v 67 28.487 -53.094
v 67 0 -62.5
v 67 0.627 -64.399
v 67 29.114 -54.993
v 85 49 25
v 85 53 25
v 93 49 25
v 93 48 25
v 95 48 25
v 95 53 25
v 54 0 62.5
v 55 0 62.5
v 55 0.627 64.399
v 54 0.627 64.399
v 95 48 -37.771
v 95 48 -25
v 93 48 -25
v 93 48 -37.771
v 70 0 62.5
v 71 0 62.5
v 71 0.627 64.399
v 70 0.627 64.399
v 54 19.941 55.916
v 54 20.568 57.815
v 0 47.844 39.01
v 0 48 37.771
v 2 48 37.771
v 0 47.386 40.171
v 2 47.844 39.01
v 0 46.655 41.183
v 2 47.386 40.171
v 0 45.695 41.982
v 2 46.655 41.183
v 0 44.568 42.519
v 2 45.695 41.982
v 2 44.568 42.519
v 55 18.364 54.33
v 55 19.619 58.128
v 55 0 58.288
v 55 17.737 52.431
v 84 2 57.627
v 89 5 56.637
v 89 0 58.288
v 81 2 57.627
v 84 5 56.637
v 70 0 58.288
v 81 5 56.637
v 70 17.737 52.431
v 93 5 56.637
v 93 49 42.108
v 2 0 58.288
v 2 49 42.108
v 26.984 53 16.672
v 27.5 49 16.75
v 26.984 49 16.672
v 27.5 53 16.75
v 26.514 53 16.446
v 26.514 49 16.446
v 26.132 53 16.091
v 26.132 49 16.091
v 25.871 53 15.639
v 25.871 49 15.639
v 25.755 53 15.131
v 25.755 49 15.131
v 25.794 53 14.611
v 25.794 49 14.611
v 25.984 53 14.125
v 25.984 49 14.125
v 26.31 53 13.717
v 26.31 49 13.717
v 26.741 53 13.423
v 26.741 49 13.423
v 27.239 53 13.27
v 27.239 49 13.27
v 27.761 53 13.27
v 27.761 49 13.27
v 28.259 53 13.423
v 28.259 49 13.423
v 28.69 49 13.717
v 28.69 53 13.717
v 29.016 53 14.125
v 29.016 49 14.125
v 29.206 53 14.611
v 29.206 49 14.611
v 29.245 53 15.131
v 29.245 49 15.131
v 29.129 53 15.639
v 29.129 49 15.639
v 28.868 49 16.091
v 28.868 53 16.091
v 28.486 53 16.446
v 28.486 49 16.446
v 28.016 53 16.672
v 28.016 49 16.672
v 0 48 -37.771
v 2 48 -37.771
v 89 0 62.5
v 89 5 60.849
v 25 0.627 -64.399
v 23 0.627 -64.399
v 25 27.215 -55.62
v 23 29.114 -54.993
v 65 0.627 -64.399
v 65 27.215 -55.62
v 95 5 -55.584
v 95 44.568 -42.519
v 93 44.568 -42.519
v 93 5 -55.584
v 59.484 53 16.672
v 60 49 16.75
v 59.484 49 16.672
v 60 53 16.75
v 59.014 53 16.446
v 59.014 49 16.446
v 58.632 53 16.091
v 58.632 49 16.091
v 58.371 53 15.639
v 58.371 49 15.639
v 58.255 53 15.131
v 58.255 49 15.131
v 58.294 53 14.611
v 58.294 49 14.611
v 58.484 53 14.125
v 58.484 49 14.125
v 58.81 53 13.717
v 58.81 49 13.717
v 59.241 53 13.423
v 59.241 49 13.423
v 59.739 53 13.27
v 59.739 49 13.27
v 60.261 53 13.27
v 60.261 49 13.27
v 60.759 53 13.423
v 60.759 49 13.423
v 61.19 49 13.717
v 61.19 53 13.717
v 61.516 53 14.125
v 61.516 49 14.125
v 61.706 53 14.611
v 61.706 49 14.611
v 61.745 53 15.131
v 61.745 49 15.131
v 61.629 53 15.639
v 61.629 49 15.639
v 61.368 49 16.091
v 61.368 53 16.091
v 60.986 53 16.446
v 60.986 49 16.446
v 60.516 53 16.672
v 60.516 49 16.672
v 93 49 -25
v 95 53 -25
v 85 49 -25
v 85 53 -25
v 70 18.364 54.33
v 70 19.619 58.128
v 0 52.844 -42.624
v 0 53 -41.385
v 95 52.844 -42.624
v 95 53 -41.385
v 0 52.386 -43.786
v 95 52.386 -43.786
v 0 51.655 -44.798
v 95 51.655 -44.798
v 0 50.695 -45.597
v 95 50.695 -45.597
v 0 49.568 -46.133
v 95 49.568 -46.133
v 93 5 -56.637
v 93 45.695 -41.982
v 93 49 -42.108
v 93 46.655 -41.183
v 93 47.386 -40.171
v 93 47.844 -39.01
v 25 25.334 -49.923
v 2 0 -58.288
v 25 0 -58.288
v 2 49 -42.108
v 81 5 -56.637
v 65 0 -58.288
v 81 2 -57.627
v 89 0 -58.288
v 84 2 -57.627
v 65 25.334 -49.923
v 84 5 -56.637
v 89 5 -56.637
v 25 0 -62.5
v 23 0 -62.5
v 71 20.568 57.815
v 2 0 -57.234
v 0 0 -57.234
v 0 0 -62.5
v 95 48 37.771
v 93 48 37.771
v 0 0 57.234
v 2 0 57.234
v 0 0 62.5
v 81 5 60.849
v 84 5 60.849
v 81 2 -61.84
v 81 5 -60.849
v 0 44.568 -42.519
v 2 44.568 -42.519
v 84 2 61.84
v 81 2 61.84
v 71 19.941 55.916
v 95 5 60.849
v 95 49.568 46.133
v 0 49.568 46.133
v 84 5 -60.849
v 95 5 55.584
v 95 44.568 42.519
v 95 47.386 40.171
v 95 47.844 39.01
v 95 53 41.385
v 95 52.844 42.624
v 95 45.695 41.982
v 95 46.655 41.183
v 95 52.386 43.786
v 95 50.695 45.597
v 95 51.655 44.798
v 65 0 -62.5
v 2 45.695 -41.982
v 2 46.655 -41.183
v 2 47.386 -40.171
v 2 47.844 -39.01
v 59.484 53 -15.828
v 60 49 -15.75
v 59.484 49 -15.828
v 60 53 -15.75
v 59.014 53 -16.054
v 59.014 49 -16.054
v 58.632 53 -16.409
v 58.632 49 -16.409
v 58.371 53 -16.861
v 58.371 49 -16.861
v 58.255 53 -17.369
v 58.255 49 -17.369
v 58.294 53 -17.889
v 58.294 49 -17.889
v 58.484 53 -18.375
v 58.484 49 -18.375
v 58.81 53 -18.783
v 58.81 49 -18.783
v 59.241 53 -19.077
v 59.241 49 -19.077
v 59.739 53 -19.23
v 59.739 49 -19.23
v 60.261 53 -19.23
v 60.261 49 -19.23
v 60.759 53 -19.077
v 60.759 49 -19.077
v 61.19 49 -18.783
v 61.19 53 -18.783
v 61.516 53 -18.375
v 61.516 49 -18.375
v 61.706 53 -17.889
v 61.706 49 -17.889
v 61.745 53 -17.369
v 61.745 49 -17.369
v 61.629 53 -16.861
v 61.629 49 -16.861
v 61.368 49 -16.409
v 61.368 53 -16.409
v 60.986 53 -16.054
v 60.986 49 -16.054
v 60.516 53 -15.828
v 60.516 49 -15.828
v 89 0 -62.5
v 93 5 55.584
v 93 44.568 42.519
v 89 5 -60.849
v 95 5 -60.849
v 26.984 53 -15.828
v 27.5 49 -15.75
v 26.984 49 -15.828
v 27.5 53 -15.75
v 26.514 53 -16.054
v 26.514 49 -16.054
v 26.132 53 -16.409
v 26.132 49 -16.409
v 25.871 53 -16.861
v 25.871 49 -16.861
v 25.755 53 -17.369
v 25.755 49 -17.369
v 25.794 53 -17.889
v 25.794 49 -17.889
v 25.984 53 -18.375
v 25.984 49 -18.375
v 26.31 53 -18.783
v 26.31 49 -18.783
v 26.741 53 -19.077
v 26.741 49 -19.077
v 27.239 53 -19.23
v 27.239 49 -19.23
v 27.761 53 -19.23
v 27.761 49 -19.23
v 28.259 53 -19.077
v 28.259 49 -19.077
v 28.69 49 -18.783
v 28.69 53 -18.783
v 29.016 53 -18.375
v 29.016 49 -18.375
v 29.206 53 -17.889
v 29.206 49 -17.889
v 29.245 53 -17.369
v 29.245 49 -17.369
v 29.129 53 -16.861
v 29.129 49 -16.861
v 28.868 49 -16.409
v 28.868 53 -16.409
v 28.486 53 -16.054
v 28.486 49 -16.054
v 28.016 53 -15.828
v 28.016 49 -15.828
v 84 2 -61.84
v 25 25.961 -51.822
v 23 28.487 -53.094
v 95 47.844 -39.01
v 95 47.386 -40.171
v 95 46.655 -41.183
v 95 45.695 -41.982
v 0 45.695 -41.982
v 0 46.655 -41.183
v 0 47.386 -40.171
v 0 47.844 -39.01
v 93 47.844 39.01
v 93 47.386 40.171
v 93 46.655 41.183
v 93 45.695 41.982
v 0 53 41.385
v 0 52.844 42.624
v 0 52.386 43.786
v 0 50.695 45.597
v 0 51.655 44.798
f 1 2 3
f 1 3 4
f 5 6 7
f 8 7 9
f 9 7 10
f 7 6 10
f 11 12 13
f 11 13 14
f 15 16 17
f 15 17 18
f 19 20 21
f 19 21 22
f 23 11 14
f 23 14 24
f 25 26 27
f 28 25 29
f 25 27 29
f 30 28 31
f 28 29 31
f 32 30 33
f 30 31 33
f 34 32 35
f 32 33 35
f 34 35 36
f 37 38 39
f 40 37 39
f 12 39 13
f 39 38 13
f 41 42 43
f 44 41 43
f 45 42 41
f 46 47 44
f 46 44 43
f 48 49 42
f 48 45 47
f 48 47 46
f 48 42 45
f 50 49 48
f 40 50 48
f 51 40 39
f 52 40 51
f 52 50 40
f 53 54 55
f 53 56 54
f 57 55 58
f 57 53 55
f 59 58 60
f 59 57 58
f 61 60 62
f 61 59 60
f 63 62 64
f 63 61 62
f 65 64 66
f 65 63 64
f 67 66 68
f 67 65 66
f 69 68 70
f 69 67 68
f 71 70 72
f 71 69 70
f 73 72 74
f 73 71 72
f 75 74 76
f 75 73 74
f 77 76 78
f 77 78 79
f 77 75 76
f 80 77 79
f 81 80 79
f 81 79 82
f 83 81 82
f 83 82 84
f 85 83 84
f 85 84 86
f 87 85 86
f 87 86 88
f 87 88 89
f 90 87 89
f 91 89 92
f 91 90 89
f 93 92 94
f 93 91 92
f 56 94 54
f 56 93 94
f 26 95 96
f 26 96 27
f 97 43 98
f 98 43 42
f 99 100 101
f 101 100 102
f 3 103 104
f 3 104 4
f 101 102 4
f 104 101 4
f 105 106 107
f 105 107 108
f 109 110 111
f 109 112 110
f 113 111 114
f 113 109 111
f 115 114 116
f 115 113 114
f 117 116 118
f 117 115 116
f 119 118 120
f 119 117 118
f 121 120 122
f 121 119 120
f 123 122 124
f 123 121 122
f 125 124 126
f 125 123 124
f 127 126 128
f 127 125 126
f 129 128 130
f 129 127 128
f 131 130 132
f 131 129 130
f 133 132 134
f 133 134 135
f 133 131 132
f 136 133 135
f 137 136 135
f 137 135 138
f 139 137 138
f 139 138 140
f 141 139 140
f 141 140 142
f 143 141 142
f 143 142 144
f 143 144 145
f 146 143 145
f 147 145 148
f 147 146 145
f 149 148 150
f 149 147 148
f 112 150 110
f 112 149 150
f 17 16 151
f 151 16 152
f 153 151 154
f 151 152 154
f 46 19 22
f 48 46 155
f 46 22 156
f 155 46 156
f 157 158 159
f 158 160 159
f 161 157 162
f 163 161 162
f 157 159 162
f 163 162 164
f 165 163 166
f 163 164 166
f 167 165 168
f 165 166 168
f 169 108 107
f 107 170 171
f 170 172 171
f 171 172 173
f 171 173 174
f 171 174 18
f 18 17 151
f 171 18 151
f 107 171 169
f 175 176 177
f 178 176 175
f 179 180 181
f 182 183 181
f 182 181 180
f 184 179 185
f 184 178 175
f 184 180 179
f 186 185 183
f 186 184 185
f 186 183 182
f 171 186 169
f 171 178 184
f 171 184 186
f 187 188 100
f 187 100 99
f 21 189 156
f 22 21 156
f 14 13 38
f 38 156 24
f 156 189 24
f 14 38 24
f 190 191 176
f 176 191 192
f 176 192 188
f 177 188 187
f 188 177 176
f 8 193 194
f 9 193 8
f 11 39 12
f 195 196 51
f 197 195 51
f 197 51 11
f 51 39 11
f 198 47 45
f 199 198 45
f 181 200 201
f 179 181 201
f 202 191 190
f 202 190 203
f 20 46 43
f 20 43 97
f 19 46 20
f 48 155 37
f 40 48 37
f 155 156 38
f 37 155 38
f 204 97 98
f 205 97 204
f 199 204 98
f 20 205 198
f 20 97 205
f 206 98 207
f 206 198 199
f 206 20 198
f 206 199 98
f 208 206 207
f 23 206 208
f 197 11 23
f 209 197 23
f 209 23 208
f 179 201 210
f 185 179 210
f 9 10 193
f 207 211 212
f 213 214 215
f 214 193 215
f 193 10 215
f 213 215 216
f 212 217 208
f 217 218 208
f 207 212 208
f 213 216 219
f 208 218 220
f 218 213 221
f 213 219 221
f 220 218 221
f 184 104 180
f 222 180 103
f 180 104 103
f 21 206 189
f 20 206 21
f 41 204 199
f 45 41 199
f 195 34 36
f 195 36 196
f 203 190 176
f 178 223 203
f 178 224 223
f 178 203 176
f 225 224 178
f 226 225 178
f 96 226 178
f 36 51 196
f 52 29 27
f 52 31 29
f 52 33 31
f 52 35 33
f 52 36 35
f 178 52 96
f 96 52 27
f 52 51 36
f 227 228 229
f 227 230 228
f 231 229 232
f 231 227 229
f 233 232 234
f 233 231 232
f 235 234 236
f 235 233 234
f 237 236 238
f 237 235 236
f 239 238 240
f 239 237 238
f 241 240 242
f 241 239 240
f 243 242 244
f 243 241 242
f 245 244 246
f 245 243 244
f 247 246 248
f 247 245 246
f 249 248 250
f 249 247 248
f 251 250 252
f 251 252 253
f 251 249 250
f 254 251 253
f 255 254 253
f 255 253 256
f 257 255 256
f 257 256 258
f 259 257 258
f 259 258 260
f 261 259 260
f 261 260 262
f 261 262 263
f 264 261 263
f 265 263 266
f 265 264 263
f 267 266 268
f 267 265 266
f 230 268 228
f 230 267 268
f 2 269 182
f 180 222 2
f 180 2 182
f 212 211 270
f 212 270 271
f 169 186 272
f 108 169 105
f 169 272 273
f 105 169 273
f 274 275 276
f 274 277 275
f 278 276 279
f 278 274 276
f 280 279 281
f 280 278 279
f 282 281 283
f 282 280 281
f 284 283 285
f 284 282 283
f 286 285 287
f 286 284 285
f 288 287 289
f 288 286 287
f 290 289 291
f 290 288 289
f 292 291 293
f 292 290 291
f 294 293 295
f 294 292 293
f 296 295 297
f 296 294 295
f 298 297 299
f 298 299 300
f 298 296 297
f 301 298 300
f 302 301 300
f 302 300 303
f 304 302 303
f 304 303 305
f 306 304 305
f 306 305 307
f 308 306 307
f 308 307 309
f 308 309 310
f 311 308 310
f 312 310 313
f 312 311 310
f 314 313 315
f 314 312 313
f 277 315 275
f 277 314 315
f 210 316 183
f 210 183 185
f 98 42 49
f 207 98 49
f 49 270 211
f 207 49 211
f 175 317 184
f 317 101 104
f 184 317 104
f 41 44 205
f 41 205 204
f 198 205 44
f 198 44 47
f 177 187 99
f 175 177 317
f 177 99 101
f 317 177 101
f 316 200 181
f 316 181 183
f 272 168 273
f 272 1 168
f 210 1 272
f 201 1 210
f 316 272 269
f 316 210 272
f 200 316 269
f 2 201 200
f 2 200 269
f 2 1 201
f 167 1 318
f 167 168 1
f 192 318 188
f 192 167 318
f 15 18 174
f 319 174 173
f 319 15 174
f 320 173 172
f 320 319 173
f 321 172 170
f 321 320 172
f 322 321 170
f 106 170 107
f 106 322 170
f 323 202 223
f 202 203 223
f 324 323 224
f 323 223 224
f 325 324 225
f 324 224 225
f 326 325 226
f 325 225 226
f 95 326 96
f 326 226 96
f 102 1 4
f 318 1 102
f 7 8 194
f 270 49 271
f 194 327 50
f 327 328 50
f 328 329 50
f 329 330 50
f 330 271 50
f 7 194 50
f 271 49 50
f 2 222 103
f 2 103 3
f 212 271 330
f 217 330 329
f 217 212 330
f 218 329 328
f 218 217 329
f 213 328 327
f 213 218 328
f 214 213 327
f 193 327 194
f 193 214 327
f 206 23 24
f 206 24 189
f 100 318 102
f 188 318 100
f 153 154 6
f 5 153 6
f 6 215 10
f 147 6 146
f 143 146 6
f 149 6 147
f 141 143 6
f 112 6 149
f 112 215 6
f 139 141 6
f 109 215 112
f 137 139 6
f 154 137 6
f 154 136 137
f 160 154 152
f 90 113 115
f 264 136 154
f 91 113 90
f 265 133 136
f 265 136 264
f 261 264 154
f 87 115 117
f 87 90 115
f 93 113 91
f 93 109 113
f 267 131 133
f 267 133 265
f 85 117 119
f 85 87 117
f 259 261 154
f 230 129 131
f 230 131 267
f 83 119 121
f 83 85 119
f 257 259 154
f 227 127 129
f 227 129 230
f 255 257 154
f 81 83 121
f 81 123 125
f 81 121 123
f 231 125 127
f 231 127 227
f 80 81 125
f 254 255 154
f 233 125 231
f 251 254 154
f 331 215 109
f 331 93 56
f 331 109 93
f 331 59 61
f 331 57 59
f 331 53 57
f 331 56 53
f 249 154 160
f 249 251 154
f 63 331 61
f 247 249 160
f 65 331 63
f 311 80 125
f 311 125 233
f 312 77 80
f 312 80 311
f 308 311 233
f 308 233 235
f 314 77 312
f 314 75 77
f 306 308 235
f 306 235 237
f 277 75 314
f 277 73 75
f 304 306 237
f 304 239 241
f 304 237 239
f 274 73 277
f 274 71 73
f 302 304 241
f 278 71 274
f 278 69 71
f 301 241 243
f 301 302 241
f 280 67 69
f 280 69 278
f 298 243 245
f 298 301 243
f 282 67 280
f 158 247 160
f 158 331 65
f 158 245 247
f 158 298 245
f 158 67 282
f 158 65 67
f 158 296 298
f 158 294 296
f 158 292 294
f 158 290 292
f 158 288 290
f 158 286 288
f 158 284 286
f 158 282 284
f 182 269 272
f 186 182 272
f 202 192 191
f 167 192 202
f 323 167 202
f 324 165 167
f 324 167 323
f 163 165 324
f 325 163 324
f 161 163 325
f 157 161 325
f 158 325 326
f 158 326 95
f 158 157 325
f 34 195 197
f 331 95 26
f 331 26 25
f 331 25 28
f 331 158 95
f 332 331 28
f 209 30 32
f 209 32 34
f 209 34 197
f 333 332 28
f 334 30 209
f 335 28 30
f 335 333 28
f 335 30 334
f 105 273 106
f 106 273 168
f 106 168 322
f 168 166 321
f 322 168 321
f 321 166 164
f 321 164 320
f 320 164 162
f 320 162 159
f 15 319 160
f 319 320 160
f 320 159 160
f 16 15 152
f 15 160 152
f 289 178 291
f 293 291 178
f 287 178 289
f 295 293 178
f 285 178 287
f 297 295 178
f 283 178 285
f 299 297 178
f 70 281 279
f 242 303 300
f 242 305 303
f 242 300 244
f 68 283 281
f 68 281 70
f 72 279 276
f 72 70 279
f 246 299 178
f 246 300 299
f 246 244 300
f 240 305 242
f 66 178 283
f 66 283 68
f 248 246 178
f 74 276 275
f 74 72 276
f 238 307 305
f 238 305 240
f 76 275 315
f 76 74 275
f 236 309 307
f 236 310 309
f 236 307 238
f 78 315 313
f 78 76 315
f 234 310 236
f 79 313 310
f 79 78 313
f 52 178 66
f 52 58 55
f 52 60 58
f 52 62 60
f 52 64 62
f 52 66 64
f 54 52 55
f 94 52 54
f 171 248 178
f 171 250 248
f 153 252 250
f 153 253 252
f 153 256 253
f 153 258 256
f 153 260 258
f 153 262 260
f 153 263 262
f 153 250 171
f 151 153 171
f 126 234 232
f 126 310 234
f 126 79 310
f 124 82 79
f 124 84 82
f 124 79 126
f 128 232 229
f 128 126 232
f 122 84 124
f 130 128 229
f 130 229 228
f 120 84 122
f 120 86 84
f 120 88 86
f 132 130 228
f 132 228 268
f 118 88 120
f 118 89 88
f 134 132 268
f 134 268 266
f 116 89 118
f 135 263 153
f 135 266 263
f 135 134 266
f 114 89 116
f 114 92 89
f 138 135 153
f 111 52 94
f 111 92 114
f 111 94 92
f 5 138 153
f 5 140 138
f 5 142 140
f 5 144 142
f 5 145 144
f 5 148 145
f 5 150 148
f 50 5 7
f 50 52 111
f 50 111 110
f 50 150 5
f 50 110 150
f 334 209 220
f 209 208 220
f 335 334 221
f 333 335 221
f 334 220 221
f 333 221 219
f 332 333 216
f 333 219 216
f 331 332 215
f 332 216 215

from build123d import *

# Parameters (mm, degrees)
EXTRUDE_1_DEPTH          = 95
EXTRUDE_3_DEPTH          = 20
CUT_EXTRUDE_1_DEPTH      = 142.209950074
CUT_EXTRUDE_1_DEPTH_BACK = 142.209950074
SKETCH_4_W               = 7
SKETCH_4_H               = 3
CUT_EXTRUDE_2_DEPTH      = 142.209950074
SHELL_START              = 2
SHELL_1_DEPTH            = 91
SHELL_START_2            = 93
SHELL_1_2_DEPTH          = 2.83772234
SHELL_1_3_DEPTH          = 3
CUT_EXTRUDE_3_DEPTH      = 3
SKETCH_7_R               = 1.75
SKETCH_7_W               = 10
SKETCH_7_H               = 50
CUT_EXTRUDE_4_DEPTH      = 142.209950074
SKETCH_9_W               = 15
SKETCH_9_H               = 20
CUT_EXTRUDE_5_DEPTH      = 3
EXTRUDE_4_DEPTH          = 2
EXTRUDE_6_DEPTH          = 2
SKETCH_13_W              = 40
SKETCH_13_H              = 28
CUT_EXTRUDE_6_DEPTH      = 2
CUT_EXTRUDE_7_DEPTH      = 10
FILLET_1_R               = 5
FILLET_2_R               = 5
EXTRUDE_7_DEPTH          = 2
EXTRUDE_8_DEPTH          = 2
SKETCH_17_R              = 1.75
EXTRUDE_9_DEPTH          = 2
SKETCH_18_W              = 120.1322677
SKETCH_18_H              = 134.585681159
CUT_EXTRUDE_8_DEPTH      = 2
SKETCH_20_W              = 175.540954957
SKETCH_20_H              = 97.306035525
CUT_EXTRUDE_9_DEPTH      = 39
CUT_EXTRUDE_10_DEPTH     = 39
SKETCH_23_W              = 6
SKETCH_23_H              = 5
SKETCH_23_W_2            = 3
SKETCH_23_H_2            = 3
CUT_EXTRUDE_11_DEPTH     = 181.790250578


with BuildPart() as part:
    # 草图1 → 凸台-拉伸1 (new body)
    with BuildSketch(Plane(origin=(0, 0, 0), x_dir=(0, 0, -1), z_dir=(1, 0, 0))):
        Polygon((-62.5, 0), (-45, 53), (45, 53), (62.5, 0), align=None)
    extrude(amount=EXTRUDE_1_DEPTH)

    # 草图3 → 凸台-拉伸3 (add)
    with BuildSketch(Plane(origin=(95, 0, 0), x_dir=(0, 0, -1), z_dir=(1, 0, 0))):
        Polygon((-60.849056604, 5), (-47.5, 5), (-47.5, 0), (-62.5, 0), align=None)
        Polygon((62.5, 0), (60.849056604, 5), (47.5, 5), (47.5, 0), align=None)
    extrude(amount=EXTRUDE_3_DEPTH)

    # 草图4 → 切除-拉伸1 (cut, two sides: drawn at the far end of the back side and taken through both)
    with BuildSketch(Plane.XY.offset(-CUT_EXTRUDE_1_DEPTH_BACK)):
        with Locations((105, 1.5)):
            Rectangle(SKETCH_4_W, SKETCH_4_H)
    extrude(amount=CUT_EXTRUDE_1_DEPTH + CUT_EXTRUDE_1_DEPTH_BACK, mode=Mode.SUBTRACT)

    # 草图5 → 切除-拉伸2 (cut, through all)
    with BuildSketch(Plane.XZ):
        with BuildLine():
            Line((97.5, -59), (97.5, -51))
            ThreePointArc((97.5, -51), (99, -49.5), (100.5, -51))
            Line((100.5, -51), (100.5, -59))
            ThreePointArc((100.5, -59), (99, -60.5), (97.5, -59))
        make_face()
        with BuildLine():
            Line((109.5, -59), (109.5, -51))
            ThreePointArc((109.5, -51), (111, -49.5), (112.5, -51))
            Line((112.5, -51), (112.5, -59))
            ThreePointArc((112.5, -59), (111, -60.5), (109.5, -59))
        make_face()
        with BuildLine():
            Line((97.5, 51), (97.5, 59))
            ThreePointArc((97.5, 59), (99, 60.5), (100.5, 59))
            Line((100.5, 59), (100.5, 51))
            ThreePointArc((100.5, 51), (99, 49.5), (97.5, 51))
        make_face()
        with BuildLine():
            Line((109.5, 51), (109.5, 59))
            ThreePointArc((109.5, 59), (111, 60.5), (112.5, 59))
            Line((112.5, 59), (112.5, 51))
            ThreePointArc((112.5, 51), (111, 49.5), (109.5, 51))
        make_face()
    extrude(amount=-CUT_EXTRUDE_2_DEPTH, mode=Mode.SUBTRACT)

    # 抽壳1: read off the stored shape, not the designer's step
    # 抽壳1 outline → 抽壳1 (cut)
    with BuildSketch(Plane.YZ.offset(SHELL_START)):
        Polygon((51, 43.554172654), (0, 60.393795296), (0, -60.393795296), (51, -43.554172654), align=None)
    extrude(amount=SHELL_1_DEPTH, mode=Mode.SUBTRACT)

    # Shell 1 2 outline → Shell 1 2 (cut)
    with BuildSketch(Plane.YZ.offset(SHELL_START_2)):
        Polygon((3, 49.5), (3, 59.403229258), (0, 60.393795296), (0, 49.5), align=None)
        Polygon((3, -49.5), (0, -49.5), (0, -60.393795296), (3, -59.403229258), align=None)
    extrude(amount=SHELL_1_2_DEPTH, mode=Mode.SUBTRACT)

    # Shell 1 3 outline → Shell 1 3 (add)
    with BuildSketch(Plane(origin=(0, 0, 0), x_dir=(1, 0, 0), z_dir=(0, 1, 0))):
        with BuildLine():
            Line((95.789496196, -60.393795296), (95.83772234, -60.504880632))
            Line((95.83772234, -60.504880632), (95.83772234, -49.5))
            ThreePointArc((95.83772234, -49.5), (95.585474278, -50.231225589), (95.5, -51))
            Line((95.5, -51), (95.5, -59))
            ThreePointArc((95.5, -59), (95.57313822, -59.711771272), (95.789496196, -60.393795296))
        make_face()
        with BuildLine():
            ThreePointArc((95.789496196, 60.393795296), (95.57313822, 59.711771272), (95.5, 59))
            Line((95.5, 59), (95.5, 51))
            ThreePointArc((95.5, 51), (95.585474278, 50.231225589), (95.83772234, 49.5))
            Line((95.83772234, 49.5), (95.83772234, 60.504880632))
            Line((95.83772234, 60.504880632), (95.789496196, 60.393795296))
        make_face()
    extrude(amount=SHELL_1_3_DEPTH)

    # 草图6 → 切除-拉伸3 (cut)
    with BuildSketch(Plane(origin=(95, 0, 0), x_dir=(0, 0, -1), z_dir=(1, 0, 0))):
        with BuildLine():
            Line((-37.770863272, 48), (37.770863272, 48))
            ThreePointArc((37.770863272, 48), (40.700157086, 47.052065862), (42.518739858, 44.567695099))
            Line((42.518739858, 44.567695099), (55.583544844, 5))
            Line((55.583544844, 5), (47.5, 5))
            Line((47.5, 5), (47.5, 0))
            Line((47.5, 0), (-47.5, 0))
            Line((-47.5, 0), (-47.5, 5))
            Line((-47.5, 5), (-55.583544844, 5))
            Line((-55.583544844, 5), (-42.518739858, 44.567695099))
            ThreePointArc((-42.518739858, 44.567695099), (-40.700157086, 47.052065862), (-37.770863272, 48))
        make_face()
    extrude(amount=-CUT_EXTRUDE_3_DEPTH, mode=Mode.SUBTRACT)

    # 草图7 → 切除-拉伸4 (cut, through all)
    with BuildSketch(Plane(origin=(0, 53, 0), x_dir=(1, 0, 0), z_dir=(0, 1, 0))):
        with Locations(Location((60, -15, 0), (0, 0, 270))):
            Circle(SKETCH_7_R)
        with Locations(Location((60, 17.5, 0), (0, 0, 270))):
            Circle(SKETCH_7_R)
        with Locations(Location((27.5, 17.5, 0), (0, 0, 270))):
            Circle(SKETCH_7_R)
        with Locations(Location((27.5, -15, 0), (0, 0, 270))):
            Circle(SKETCH_7_R)
        with Locations((90, 0)):
            Rectangle(SKETCH_7_W, SKETCH_7_H)
    extrude(amount=-CUT_EXTRUDE_4_DEPTH, mode=Mode.SUBTRACT)

    # 草图9 → 切除-拉伸5 (cut)
    with BuildSketch(Plane(origin=(0, 18.608057138, 56.35583019), x_dir=(1, 0, 0), z_dir=(0, 0.3135390198315126, 0.949575317204009))):
        with Locations((62.5, -9.596188739)):
            Rectangle(SKETCH_9_W, SKETCH_9_H)
    extrude(amount=-CUT_EXTRUDE_5_DEPTH, mode=Mode.SUBTRACT)

    # 草图10 → 凸台-拉伸4 (add)
    with BuildSketch(Plane(origin=(0, 18.608057138, 56.35583019), x_dir=(1, 0, 0), z_dir=(0, 0.3135390198315126, 0.949575317204009))):
        Polygon((55, -19.596188739), (54, -19.596188739), (54, 1.403811261), (71, 1.403811261), (71, -19.596188739), (70, -19.596188739), (70, 0.403811261), (55, 0.403811261), align=None)
    extrude(amount=EXTRUDE_4_DEPTH)

    # 草图11 → 凸台-拉伸6 (add)
    with BuildSketch(Plane(origin=(0, 18.608057138, -56.35583019), x_dir=(-1, 0, 0), z_dir=(0, 0.3135390198315126, -0.949575317204009))):
        Polygon((-67, -19.596188739), (-67, 10.403811261), (-23, 10.403811261), (-23, -19.596188739), (-25, -19.596188739), (-25, 8.403811261), (-65, 8.403811261), (-65, -19.596188739), align=None)
    extrude(amount=EXTRUDE_6_DEPTH)

    # 草图13 → 切除-拉伸6 (cut)
    with BuildSketch(Plane(origin=(0, 18.608057138, -56.35583019), x_dir=(-1, 0, 0), z_dir=(0, 0.3135390198315126, -0.949575317204009))):
        with Locations((-45, -5.596188739)):
            Rectangle(SKETCH_13_W, SKETCH_13_H)
    extrude(amount=-CUT_EXTRUDE_6_DEPTH, mode=Mode.SUBTRACT)

    # 草图14 → 切除-拉伸7 (cut)
    with BuildSketch(Plane.ZY):
        Polygon((-41.385431636, 48), (41.385431636, 48), (57.23448824, 0), (-57.23448824, 0), align=None)
    extrude(amount=-CUT_EXTRUDE_7_DEPTH, mode=Mode.SUBTRACT)

    # 圆角1
    fillet_1_edges = [part.edges().sort_by_distance(p)[0] for p in [
        (47.5, 53, 45),
        (47.5, 53, -45),
    ]]
    fillet(fillet_1_edges, radius=FILLET_1_R)

    # 圆角2
    fillet_2_edges = [part.edges().sort_by_distance(p)[0] for p in [
        (1, 48, -41.385431636),
        (1, 48, 41.385431636),
    ]]
    fillet(fillet_2_edges, radius=FILLET_2_R)

    # 草图15 → 凸台-拉伸7 (add)
    with BuildSketch(Plane(origin=(0, 17.980979099, 54.456679556), x_dir=(-1, 0, 0), z_dir=(0, -0.3135390198315126, -0.949575317204009))):
        with BuildLine():
            Line((-70, -18.935811381), (-70, 0.403811261))
            Line((-70, 0.403811261), (-55, 0.403811261))
            Line((-55, 0.403811261), (-55, -18.935811381))
            Line((-55, -18.935811381), (-2, -18.935811381))
            Line((-2, -18.935811381), (-2, 34.772408574))
            Line((-2, 34.772408574), (-93, 34.772408574))
            Line((-93, 34.772408574), (-93, -15.776504325))
            Line((-93, -15.776504325), (-95.523305282, -15.776504325))
            add(Edge.make_bspline(
                [(-95.789496196, -18.935811381), (-95.583035108, -17.41903761), (-95.523305282, -15.776504325)],
                knots=[1.16121292, 1.16121292, 1.16121292, 1.455331574, 1.455331574, 1.455331574], degree=2, weights=[1, 0.989206251, 1]))
            Line((-95.789496196, -18.935811381), (-70, -18.935811381))
        make_face()
    extrude(amount=EXTRUDE_7_DEPTH)

    # 草图16 → 凸台-拉伸8 (add)
    with BuildSketch(Plane(origin=(0, 17.980979099, -54.456679556), x_dir=(1, 0, 0), z_dir=(0, -0.3135390198315126, 0.949575317204009))):
        with BuildLine():
            Line((65, 8.403811261), (65, -18.935811381))
            Line((65, -18.935811381), (95.789496196, -18.935811381))
            add(Edge.make_bspline(
                [(95.523305282, -15.776504325), (95.583035108, -17.41903761), (95.789496196, -18.935811381)],
                knots=[4.827853734, 4.827853734, 4.827853734, 5.121972388, 5.121972388, 5.121972388], degree=2, weights=[1, 0.989206251, 1]))
            Line((95.523305282, -15.776504325), (93, -15.776504325))
            Line((93, -15.776504325), (93, 34.772408574))
            Line((93, 34.772408574), (2, 34.772408574))
            Line((2, 34.772408574), (2, -18.935811381))
            Line((2, -18.935811381), (25, -18.935811381))
            Line((25, -18.935811381), (25, 8.403811261))
            Line((25, 8.403811261), (65, 8.403811261))
        make_face()
    extrude(amount=EXTRUDE_8_DEPTH)

    # 草图17 → 凸台-拉伸9 (add)
    with BuildSketch(Plane.XZ.offset(-51)):
        Polygon((85, 25), (93, 25), (93, 43.554172654), (2, 43.554172654), (2, -43.554172654), (93, -43.554172654), (93, -25), (85, -25), align=None)
        with Locations(Location((60, -17.5, 0), (0, 0, 90))):
            Circle(SKETCH_17_R, mode=Mode.SUBTRACT)
        with Locations(Location((27.5, -17.5, 0), (0, 0, 90))):
            Circle(SKETCH_17_R, mode=Mode.SUBTRACT)
        with Locations(Location((60, 15, 0), (0, 0, 90))):
            Circle(SKETCH_17_R, mode=Mode.SUBTRACT)
        with Locations(Location((27.5, 15, 0), (0, 0, 90))):
            Circle(SKETCH_17_R, mode=Mode.SUBTRACT)
    extrude(amount=EXTRUDE_9_DEPTH)

    # 草图18 → 切除-拉伸8 (cut)
    with BuildSketch(Plane(origin=(0, 0, 0), x_dir=(1, 0, 0), z_dir=(0, 1, 0))):
        with Locations((58.156973339, 0.12316308)):
            Rectangle(SKETCH_18_W, SKETCH_18_H)
    extrude(amount=-CUT_EXTRUDE_8_DEPTH, mode=Mode.SUBTRACT)

    # 草图20 → 切除-拉伸9 (cut)
    with BuildSketch(Plane(origin=(95, 0, 0), x_dir=(0, 0, -1), z_dir=(1, 0, 0))):
        with Locations((3.171805167, 26.174924158)):
            Rectangle(SKETCH_20_W, SKETCH_20_H)
    extrude(amount=CUT_EXTRUDE_9_DEPTH, mode=Mode.SUBTRACT)

    # 草图21 → 切除-拉伸10 (cut)
    with BuildSketch(Plane(origin=(95, 0, 0), x_dir=(0, 0, -1), z_dir=(1, 0, 0))):
        Polygon((-43.861204642, 40.501944611), (-57.23448824, 0), (57.23448824, 0), (43.861204642, 40.501944611), align=None)
    extrude(amount=-CUT_EXTRUDE_10_DEPTH, mode=Mode.SUBTRACT)

    # 草图23 → 切除-拉伸11 (cut, through all)
    with BuildSketch(Plane.XY.offset(-80)):
        with Locations((92, 2.5)):
            Rectangle(SKETCH_23_W, SKETCH_23_H)
        with Locations((82.5, 3.5)):
            Rectangle(SKETCH_23_W_2, SKETCH_23_H_2)
    extrude(amount=CUT_EXTRUDE_11_DEPTH, mode=Mode.SUBTRACT)


solid = part.part
